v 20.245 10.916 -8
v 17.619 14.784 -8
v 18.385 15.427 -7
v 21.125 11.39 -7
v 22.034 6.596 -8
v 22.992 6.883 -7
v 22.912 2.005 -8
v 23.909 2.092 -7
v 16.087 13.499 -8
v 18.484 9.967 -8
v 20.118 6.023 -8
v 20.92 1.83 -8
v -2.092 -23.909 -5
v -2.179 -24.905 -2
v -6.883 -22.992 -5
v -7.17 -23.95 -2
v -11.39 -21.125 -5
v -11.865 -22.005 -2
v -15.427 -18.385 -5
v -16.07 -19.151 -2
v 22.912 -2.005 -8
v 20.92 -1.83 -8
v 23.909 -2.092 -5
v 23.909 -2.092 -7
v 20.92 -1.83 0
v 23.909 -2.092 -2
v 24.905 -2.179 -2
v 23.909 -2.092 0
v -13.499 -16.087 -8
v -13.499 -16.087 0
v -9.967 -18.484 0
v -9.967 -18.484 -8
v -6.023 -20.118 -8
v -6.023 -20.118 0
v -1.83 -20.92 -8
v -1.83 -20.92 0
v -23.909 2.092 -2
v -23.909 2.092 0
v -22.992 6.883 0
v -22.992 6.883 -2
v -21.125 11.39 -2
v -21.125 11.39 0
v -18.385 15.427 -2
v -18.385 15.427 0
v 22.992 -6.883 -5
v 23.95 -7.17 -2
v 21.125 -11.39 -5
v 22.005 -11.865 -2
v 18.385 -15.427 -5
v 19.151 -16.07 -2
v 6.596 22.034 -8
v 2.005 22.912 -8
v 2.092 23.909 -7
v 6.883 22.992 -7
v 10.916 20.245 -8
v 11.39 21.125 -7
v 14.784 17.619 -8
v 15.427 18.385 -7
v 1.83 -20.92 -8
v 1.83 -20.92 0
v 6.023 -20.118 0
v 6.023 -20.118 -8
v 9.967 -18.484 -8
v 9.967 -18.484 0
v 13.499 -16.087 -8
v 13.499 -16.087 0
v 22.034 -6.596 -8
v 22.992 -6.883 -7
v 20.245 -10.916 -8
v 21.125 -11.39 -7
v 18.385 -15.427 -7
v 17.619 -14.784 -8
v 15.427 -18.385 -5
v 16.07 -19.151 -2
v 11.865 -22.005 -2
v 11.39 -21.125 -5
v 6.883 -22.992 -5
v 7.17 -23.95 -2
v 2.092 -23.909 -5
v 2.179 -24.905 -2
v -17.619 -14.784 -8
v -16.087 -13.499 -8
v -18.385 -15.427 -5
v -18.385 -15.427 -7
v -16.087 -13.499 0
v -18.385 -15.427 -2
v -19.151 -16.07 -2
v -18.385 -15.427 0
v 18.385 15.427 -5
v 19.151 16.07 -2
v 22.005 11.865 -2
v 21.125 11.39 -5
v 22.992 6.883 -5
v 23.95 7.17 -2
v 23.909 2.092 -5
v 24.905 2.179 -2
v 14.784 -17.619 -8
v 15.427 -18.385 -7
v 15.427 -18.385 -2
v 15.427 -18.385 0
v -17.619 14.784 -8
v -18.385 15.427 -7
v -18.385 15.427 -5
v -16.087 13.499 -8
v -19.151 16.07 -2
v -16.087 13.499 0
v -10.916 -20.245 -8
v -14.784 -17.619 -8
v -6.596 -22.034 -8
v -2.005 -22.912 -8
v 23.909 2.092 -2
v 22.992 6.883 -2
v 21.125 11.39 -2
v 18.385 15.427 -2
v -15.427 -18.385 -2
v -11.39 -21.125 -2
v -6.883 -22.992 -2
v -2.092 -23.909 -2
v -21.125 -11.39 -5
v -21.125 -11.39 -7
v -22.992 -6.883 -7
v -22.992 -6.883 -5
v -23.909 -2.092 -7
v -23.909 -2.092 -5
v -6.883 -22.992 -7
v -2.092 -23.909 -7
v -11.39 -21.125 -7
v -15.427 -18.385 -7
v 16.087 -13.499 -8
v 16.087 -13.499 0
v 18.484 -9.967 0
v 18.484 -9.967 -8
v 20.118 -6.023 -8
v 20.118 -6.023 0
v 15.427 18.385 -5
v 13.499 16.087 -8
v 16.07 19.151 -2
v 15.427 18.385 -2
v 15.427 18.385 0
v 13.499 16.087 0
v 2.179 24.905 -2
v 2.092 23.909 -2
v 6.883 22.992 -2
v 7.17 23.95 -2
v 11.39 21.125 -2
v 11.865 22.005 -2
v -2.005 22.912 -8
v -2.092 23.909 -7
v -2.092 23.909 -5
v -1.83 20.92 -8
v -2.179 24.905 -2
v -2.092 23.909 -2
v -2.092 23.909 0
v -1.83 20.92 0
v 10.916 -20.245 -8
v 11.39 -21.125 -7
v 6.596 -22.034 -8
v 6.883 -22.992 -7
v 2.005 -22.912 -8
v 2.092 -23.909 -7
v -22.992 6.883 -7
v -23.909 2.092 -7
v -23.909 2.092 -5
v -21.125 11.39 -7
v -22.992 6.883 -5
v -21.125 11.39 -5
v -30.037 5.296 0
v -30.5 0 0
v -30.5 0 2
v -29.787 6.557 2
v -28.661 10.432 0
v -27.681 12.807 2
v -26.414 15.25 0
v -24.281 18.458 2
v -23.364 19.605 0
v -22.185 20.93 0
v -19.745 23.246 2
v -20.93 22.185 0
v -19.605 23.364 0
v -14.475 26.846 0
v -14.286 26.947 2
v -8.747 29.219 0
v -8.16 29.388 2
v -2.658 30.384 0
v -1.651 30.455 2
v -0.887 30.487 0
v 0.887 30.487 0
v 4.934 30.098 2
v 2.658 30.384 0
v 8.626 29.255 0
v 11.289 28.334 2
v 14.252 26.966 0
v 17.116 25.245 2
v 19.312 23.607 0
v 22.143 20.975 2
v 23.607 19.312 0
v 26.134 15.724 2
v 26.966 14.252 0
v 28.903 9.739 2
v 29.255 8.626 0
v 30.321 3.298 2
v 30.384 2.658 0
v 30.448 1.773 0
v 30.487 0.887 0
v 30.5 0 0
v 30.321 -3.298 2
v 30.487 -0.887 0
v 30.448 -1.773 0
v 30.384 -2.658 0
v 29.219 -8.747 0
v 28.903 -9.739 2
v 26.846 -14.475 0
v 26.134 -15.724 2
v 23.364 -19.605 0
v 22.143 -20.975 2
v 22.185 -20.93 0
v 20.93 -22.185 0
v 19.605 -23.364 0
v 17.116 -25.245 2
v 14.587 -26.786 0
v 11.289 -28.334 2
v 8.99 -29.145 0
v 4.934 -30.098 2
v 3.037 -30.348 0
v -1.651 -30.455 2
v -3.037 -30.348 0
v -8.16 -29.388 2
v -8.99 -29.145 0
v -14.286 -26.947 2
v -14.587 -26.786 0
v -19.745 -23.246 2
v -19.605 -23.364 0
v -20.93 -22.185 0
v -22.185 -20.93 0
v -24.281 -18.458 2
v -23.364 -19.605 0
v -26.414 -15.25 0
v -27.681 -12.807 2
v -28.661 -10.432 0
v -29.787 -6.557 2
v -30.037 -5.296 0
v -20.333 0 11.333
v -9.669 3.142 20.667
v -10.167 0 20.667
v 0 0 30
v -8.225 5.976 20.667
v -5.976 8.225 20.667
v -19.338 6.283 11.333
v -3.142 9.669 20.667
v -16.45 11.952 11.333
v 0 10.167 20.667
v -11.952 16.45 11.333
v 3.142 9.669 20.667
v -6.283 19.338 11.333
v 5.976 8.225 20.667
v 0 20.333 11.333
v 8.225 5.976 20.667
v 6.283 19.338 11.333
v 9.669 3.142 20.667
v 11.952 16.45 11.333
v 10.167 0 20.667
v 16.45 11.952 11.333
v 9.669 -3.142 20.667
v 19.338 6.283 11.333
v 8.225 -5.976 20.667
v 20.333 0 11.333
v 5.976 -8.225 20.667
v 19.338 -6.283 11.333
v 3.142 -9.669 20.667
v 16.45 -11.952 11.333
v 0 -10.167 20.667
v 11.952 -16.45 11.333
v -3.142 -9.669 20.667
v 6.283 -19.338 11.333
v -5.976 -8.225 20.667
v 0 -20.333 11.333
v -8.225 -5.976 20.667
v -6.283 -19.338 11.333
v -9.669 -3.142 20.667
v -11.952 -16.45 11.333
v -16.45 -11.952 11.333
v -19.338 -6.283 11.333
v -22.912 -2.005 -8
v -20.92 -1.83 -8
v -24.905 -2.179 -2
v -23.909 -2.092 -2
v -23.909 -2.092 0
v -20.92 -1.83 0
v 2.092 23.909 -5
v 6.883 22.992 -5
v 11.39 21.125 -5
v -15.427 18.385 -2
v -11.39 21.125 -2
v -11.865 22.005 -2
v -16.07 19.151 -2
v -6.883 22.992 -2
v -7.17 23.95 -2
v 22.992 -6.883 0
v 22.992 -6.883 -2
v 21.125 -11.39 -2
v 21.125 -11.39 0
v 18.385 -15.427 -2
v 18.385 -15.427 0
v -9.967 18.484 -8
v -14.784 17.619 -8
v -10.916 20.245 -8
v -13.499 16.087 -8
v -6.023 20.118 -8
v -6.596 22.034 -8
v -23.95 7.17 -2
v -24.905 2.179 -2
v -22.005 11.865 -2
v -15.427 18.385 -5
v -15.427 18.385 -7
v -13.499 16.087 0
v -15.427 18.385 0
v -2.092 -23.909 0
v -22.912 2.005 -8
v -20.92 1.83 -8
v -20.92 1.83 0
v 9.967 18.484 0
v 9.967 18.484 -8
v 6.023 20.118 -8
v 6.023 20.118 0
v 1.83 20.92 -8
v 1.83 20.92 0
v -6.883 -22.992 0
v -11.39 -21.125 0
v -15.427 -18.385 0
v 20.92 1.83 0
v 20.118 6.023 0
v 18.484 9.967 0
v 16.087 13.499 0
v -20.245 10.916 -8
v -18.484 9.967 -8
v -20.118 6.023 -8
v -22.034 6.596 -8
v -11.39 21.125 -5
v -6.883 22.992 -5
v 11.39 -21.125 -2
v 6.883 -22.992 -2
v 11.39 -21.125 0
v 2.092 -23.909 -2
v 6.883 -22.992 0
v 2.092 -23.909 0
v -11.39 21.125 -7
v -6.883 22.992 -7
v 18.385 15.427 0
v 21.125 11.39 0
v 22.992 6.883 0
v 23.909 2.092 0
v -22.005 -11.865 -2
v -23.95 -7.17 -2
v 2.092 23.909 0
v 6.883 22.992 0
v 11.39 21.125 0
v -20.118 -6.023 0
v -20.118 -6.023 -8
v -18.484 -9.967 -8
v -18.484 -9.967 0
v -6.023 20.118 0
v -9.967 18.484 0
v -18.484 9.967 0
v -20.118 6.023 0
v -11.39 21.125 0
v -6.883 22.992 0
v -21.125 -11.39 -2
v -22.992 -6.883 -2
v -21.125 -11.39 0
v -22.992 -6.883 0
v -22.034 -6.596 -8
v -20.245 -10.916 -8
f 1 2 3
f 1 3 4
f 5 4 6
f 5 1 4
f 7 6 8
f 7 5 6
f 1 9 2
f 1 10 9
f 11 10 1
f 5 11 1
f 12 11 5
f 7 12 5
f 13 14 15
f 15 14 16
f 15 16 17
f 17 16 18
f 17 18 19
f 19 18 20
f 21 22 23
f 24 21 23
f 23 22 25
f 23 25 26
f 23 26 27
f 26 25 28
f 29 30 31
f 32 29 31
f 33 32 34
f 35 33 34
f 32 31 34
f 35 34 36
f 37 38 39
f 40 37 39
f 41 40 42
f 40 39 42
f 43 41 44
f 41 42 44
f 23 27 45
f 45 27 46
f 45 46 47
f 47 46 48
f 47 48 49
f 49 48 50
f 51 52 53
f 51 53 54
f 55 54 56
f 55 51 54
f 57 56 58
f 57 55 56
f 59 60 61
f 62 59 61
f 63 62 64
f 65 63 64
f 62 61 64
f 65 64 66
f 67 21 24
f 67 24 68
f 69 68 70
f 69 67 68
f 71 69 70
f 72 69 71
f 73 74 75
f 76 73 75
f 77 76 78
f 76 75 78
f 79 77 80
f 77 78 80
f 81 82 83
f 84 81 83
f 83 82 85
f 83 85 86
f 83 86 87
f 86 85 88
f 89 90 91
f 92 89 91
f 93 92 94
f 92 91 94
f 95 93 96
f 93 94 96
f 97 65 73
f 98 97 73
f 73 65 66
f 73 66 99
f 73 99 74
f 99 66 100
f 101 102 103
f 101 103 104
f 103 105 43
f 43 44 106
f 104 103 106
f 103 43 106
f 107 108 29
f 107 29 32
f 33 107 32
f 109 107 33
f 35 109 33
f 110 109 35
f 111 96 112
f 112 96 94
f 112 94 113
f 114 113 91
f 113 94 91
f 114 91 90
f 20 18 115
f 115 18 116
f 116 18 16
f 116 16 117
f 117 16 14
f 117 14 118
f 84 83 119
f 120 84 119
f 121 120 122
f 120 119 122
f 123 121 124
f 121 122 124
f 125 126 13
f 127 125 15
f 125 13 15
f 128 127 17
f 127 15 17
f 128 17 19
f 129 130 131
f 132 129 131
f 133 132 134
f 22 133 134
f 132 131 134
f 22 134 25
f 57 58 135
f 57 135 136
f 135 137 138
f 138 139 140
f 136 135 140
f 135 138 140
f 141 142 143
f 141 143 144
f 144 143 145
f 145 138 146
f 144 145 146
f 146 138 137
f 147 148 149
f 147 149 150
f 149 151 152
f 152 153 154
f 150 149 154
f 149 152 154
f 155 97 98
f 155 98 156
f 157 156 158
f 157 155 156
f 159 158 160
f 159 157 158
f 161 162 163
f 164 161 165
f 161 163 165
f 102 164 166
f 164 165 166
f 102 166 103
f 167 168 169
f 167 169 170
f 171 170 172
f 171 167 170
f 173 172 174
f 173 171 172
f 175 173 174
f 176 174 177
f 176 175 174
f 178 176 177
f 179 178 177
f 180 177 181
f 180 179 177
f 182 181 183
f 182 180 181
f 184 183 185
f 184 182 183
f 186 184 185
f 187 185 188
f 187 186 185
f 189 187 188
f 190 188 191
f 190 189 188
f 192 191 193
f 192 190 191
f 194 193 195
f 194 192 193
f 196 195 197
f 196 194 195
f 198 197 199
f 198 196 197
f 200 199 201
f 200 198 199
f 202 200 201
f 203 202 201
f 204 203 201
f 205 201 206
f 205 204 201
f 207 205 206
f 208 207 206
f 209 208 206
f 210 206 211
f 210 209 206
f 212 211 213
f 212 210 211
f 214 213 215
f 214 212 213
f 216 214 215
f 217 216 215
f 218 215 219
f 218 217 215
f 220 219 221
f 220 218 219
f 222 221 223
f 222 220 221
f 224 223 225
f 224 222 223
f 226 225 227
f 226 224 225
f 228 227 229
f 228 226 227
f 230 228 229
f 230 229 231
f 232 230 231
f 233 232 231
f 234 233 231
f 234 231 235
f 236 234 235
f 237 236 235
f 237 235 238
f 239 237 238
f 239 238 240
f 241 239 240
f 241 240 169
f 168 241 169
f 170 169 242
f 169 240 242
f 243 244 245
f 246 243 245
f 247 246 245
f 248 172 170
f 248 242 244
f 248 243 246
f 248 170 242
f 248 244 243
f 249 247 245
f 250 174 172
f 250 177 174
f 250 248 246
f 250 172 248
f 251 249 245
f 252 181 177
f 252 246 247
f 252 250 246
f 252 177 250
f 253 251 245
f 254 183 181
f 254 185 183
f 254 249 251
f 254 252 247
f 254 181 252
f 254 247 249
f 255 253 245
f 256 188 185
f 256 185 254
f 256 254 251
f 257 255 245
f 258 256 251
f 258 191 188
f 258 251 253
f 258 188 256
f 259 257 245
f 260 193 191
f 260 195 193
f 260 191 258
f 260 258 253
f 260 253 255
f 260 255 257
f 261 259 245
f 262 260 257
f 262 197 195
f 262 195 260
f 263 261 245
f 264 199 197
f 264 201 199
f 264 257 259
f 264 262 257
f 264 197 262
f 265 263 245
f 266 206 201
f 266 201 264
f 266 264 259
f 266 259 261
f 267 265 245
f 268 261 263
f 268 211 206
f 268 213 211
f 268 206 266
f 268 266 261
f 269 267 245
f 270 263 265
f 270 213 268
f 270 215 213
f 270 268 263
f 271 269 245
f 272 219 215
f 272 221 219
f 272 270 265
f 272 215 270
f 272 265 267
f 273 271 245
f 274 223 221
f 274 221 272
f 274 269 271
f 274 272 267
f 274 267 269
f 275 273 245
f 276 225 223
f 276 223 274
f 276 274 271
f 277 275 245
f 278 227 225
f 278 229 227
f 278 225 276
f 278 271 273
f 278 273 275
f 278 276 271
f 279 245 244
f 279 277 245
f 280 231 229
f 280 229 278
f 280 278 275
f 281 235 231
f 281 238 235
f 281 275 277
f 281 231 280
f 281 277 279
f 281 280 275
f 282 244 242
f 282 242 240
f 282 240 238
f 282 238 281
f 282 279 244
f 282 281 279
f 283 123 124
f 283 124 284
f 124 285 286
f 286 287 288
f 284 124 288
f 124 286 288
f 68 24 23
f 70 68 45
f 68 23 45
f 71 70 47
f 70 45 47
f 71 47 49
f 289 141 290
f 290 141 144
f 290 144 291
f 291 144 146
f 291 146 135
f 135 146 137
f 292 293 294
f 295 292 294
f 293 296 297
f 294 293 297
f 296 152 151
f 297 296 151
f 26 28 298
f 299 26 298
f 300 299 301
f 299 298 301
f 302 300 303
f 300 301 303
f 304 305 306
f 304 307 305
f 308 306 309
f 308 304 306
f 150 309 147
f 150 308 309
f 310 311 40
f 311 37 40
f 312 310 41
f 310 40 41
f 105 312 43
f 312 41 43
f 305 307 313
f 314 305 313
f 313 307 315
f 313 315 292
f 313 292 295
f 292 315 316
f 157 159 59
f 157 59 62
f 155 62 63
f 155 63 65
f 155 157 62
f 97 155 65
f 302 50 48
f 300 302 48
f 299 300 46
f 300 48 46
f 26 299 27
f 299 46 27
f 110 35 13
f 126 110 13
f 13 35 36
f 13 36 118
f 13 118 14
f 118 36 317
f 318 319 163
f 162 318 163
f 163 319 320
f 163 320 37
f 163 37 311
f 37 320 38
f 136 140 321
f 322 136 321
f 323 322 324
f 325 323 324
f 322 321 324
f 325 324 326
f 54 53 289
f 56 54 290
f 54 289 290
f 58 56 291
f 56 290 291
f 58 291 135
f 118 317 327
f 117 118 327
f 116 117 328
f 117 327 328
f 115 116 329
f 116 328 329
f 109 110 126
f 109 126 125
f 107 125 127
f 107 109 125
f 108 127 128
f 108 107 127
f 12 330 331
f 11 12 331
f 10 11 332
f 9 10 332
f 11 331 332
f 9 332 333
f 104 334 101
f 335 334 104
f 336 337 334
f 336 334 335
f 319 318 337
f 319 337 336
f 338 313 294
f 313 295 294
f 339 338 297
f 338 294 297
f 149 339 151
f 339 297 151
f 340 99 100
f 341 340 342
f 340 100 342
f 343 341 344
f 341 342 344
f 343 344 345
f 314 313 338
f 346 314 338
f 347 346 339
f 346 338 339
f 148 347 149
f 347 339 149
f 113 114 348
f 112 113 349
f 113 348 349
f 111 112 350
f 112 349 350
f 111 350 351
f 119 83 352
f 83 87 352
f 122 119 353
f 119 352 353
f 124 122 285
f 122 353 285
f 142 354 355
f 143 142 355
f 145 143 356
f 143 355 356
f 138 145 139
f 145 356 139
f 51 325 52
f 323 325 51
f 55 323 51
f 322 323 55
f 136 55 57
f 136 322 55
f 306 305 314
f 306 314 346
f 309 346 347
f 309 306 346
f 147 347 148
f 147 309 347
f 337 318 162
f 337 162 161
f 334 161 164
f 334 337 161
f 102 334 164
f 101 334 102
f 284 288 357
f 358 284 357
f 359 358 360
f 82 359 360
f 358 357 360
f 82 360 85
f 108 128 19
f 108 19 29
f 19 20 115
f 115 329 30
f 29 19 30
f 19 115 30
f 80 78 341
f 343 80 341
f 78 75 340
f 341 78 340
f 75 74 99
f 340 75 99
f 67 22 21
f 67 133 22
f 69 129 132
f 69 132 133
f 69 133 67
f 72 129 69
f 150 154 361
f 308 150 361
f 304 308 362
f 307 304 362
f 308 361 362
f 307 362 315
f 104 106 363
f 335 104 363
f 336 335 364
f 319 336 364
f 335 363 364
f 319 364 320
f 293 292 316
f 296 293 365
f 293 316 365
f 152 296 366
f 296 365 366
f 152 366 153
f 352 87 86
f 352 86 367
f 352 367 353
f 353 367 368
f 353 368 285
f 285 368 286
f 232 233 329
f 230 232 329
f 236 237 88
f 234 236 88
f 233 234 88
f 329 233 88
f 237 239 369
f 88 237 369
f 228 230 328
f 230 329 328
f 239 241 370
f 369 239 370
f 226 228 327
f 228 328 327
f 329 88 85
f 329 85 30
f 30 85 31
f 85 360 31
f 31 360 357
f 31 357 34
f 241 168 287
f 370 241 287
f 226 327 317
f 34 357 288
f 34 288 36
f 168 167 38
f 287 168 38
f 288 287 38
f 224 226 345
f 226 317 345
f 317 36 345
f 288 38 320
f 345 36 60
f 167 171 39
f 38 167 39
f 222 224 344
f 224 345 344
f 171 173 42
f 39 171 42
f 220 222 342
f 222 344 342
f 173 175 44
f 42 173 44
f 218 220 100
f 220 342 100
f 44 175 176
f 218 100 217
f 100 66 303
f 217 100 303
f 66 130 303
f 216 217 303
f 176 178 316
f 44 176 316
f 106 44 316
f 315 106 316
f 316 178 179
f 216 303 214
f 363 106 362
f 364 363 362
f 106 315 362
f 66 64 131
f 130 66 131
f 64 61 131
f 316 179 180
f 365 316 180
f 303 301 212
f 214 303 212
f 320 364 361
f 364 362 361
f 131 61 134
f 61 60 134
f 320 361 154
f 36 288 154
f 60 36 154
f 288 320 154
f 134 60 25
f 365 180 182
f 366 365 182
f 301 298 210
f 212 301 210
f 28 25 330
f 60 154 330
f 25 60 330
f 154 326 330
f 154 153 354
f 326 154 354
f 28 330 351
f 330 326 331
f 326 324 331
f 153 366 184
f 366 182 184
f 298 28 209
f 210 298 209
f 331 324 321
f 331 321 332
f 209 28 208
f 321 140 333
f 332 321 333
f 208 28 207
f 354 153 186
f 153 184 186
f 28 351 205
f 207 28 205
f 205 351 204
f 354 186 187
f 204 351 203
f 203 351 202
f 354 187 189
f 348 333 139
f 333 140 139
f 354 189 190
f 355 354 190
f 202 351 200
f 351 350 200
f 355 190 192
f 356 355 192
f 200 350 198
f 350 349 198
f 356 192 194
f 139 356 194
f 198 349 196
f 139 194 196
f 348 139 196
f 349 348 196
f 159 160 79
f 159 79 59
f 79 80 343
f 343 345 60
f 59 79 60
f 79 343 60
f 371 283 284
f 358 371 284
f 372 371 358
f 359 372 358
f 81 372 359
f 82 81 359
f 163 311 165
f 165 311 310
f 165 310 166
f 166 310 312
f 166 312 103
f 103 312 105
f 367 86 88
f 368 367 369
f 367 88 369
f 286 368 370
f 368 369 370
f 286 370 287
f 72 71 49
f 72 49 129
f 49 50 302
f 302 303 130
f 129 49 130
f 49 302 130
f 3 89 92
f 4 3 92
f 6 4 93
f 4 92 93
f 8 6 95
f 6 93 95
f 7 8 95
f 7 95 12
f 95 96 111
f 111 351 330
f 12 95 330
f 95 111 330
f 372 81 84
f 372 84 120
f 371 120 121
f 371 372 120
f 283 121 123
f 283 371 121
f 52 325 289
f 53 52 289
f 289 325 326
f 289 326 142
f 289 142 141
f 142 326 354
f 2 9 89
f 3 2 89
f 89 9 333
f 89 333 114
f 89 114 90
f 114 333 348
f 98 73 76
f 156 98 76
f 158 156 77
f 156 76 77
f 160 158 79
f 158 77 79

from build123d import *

# Parameters (mm, degrees)
F5_DEPTH  = 8
F6_SIZE   = 1
F10_DEPTH = 25


with BuildPart() as f3:
    # F2 (on Front) → F3 (revolve)
    with BuildSketch(Plane.XZ):
        Polygon((-30.5, 2), (-30.5, 0), (0, 0), (0, 30), align=None)
    revolve(axis=Axis((0, 0, 4.0188357234), (0, 0, -1)))

    # F4 (on face) → F5 (join)
    with BuildSketch(Plane(origin=(0, 0, 0), x_dir=(1, 0, 0), z_dir=(0, 0, -1))):
        with BuildLine():
            Line((1.8302705977, 20.9200886599), (2.0917378259, 23.9086727542))
            ThreePointArc((2.0917378259, 23.9086727542), (0, 24), (-2.0917378259, 23.9086727542))
            Line((-2.0917378259, 23.9086727542), (-1.8302705977, 20.9200886599))
            ThreePointArc((-1.8302705977, 20.9200886599), (0, 21), (1.8302705977, 20.9200886599))
        make_face()
        with BuildLine():
            Line((13.4985398034, 16.0869333055), (15.4269026325, 18.3850666349))
            ThreePointArc((15.4269026325, 18.3850666349), (9.1844023768, 22.1731087803), (2.0917378259, 23.9086727542))
            Line((2.0917378259, 23.9086727542), (1.8302705977, 20.9200886599))
            ThreePointArc((1.8302705977, 20.9200886599), (8.0363520797, 19.4014701827), (13.4985398034, 16.0869333055))
        make_face()
        with BuildLine():
            Line((16.0869333055, 13.4985398034), (18.3850666349, 15.4269026325))
            ThreePointArc((18.3850666349, 15.4269026325), (16.9705627485, 16.9705627485), (15.4269026325, 18.3850666349))
            Line((15.4269026325, 18.3850666349), (13.4985398034, 16.0869333055))
            ThreePointArc((13.4985398034, 16.0869333055), (14.8492424049, 14.8492424049), (16.0869333055, 13.4985398034))
        make_face()
        with BuildLine():
            Line((20.9200886599, 1.8302705977), (23.9086727542, 2.0917378259))
            ThreePointArc((23.9086727542, 2.0917378259), (22.1731087803, 9.1844023768), (18.3850666349, 15.4269026325))
            Line((18.3850666349, 15.4269026325), (16.0869333055, 13.4985398034))
            ThreePointArc((16.0869333055, 13.4985398034), (19.4014701827, 8.0363520797), (20.9200886599, 1.8302705977))
        make_face()
        with BuildLine():
            ThreePointArc((23.9086727542, -2.0917378259), (23.977157318, -1.0468652968), (24, 0))
            ThreePointArc((24, 0), (23.977157318, 1.0468652968), (23.9086727542, 2.0917378259))
            Line((23.9086727542, 2.0917378259), (20.9200886599, 1.8302705977))
            ThreePointArc((20.9200886599, 1.8302705977), (20.9800126532, 0.9160071347), (21, 0))
            ThreePointArc((21, 0), (20.9800126532, -0.9160071347), (20.9200886599, -1.8302705977))
            Line((20.9200886599, -1.8302705977), (23.9086727542, -2.0917378259))
        make_face()
        with BuildLine():
            ThreePointArc((18.3850666349, -15.4269026325), (22.1731087803, -9.1844023768), (23.9086727542, -2.0917378259))
            Line((23.9086727542, -2.0917378259), (20.9200886599, -1.8302705977))
            ThreePointArc((20.9200886599, -1.8302705977), (19.4014701827, -8.0363520797), (16.0869333055, -13.4985398034))
            Line((16.0869333055, -13.4985398034), (18.3850666349, -15.4269026325))
        make_face()
        with BuildLine():
            ThreePointArc((15.4269026325, -18.3850666349), (16.9705627485, -16.9705627485), (18.3850666349, -15.4269026325))
            Line((18.3850666349, -15.4269026325), (16.0869333055, -13.4985398034))
            ThreePointArc((16.0869333055, -13.4985398034), (14.8492424049, -14.8492424049), (13.4985398034, -16.0869333055))
            Line((13.4985398034, -16.0869333055), (15.4269026325, -18.3850666349))
        make_face()
        with BuildLine():
            ThreePointArc((2.0917378259, -23.9086727542), (9.1844023768, -22.1731087803), (15.4269026325, -18.3850666349))
            Line((15.4269026325, -18.3850666349), (13.4985398034, -16.0869333055))
            ThreePointArc((13.4985398034, -16.0869333055), (8.0363520797, -19.4014701827), (1.8302705977, -20.9200886599))
            Line((1.8302705977, -20.9200886599), (2.0917378259, -23.9086727542))
        make_face()
        with BuildLine():
            ThreePointArc((-2.0917378259, -23.9086727542), (0, -24), (2.0917378259, -23.9086727542))
            Line((2.0917378259, -23.9086727542), (1.8302705977, -20.9200886599))
            ThreePointArc((1.8302705977, -20.9200886599), (0, -21), (-1.8302705977, -20.9200886599))
            Line((-1.8302705977, -20.9200886599), (-2.0917378259, -23.9086727542))
        make_face()
        with BuildLine():
            ThreePointArc((-15.4269026325, -18.3850666349), (-9.1844023768, -22.1731087803), (-2.0917378259, -23.9086727542))
            Line((-2.0917378259, -23.9086727542), (-1.8302705977, -20.9200886599))
            ThreePointArc((-1.8302705977, -20.9200886599), (-8.0363520797, -19.4014701827), (-13.4985398034, -16.0869333055))
            Line((-13.4985398034, -16.0869333055), (-15.4269026325, -18.3850666349))
        make_face()
        with BuildLine():
            ThreePointArc((-18.3850666349, -15.4269026325), (-16.9705627485, -16.9705627485), (-15.4269026325, -18.3850666349))
            Line((-15.4269026325, -18.3850666349), (-13.4985398034, -16.0869333055))
            ThreePointArc((-13.4985398034, -16.0869333055), (-14.8492424049, -14.8492424049), (-16.0869333055, -13.4985398034))
            Line((-16.0869333055, -13.4985398034), (-18.3850666349, -15.4269026325))
        make_face()
        with BuildLine():
            ThreePointArc((-23.9086727542, -2.0917378259), (-22.1731087803, -9.1844023768), (-18.3850666349, -15.4269026325))
            Line((-18.3850666349, -15.4269026325), (-16.0869333055, -13.4985398034))
            ThreePointArc((-16.0869333055, -13.4985398034), (-19.4014701827, -8.0363520797), (-20.9200886599, -1.8302705977))
            Line((-20.9200886599, -1.8302705977), (-23.9086727542, -2.0917378259))
        make_face()
        with BuildLine():
            Line((-20.9200886599, 1.8302705977), (-23.9086727542, 2.0917378259))
            ThreePointArc((-23.9086727542, 2.0917378259), (-24, 0), (-23.9086727542, -2.0917378259))
            Line((-23.9086727542, -2.0917378259), (-20.9200886599, -1.8302705977))
            ThreePointArc((-20.9200886599, -1.8302705977), (-21, 0), (-20.9200886599, 1.8302705977))
        make_face()
        with BuildLine():
            Line((-16.0869333055, 13.4985398034), (-18.3850666349, 15.4269026325))
            ThreePointArc((-18.3850666349, 15.4269026325), (-22.1731087803, 9.1844023768), (-23.9086727542, 2.0917378259))
            Line((-23.9086727542, 2.0917378259), (-20.9200886599, 1.8302705977))
            ThreePointArc((-20.9200886599, 1.8302705977), (-19.4014701827, 8.0363520797), (-16.0869333055, 13.4985398034))
        make_face()
        with BuildLine():
            Line((-13.4985398034, 16.0869333055), (-15.4269026325, 18.3850666349))
            ThreePointArc((-15.4269026325, 18.3850666349), (-16.9705627485, 16.9705627485), (-18.3850666349, 15.4269026325))
            Line((-18.3850666349, 15.4269026325), (-16.0869333055, 13.4985398034))
            ThreePointArc((-16.0869333055, 13.4985398034), (-14.8492424049, 14.8492424049), (-13.4985398034, 16.0869333055))
        make_face()
        with BuildLine():
            Line((-1.8302705977, 20.9200886599), (-2.0917378259, 23.9086727542))
            ThreePointArc((-2.0917378259, 23.9086727542), (-9.1844023768, 22.1731087803), (-15.4269026325, 18.3850666349))
            Line((-15.4269026325, 18.3850666349), (-13.4985398034, 16.0869333055))
            ThreePointArc((-13.4985398034, 16.0869333055), (-8.0363520797, 19.4014701827), (-1.8302705977, 20.9200886599))
        make_face()
    extrude(amount=F5_DEPTH)

    # F6
    f6_edges = [f3.edges().sort_by_distance(p)[0] for p in [
        (2.091738, 23.908673, -8),
    ]]
    chamfer(f6_edges, length=F6_SIZE)

    # F7 (on Right) → F8 (revolve)
    with BuildSketch(Plane.YZ):
        Polygon((25, -2), (24, -2), (24, -5), align=None)
    revolve(axis=Axis((0, 0, 4.0188357234), (0, 0, -1)))

    # F9 (on Top) + F4 (on face) → F10 (cut)
    with BuildSketch(Plane.XY):
        with BuildLine():
            Line((-23.3643555151, 19.6050220954), (0, 0))
            Line((0, 0), (-19.6050220954, 23.3643555151))
            ThreePointArc((-19.6050220954, 23.3643555151), (-21.5667568262, 21.5667568262), (-23.3643555151, 19.6050220954))
        make_face()
        with BuildLine():
            Line((0, 0), (-30.3839382918, 2.6582501538))
            ThreePointArc((-30.3839382918, 2.6582501538), (-30.5, 0), (-30.3839382918, -2.6582501538))
            Line((-30.3839382918, -2.6582501538), (0, 0))
        make_face()
        with BuildLine():
            Line((-19.6050220954, -23.3643555151), (0, 0))
            Line((0, 0), (-23.3643555151, -19.6050220954))
            ThreePointArc((-23.3643555151, -19.6050220954), (-21.5667568262, -21.5667568262), (-19.6050220954, -23.3643555151))
        make_face()
        with BuildLine():
            Line((2.6582501538, -30.3839382918), (0, 0))
            Line((0, 0), (-2.6582501538, -30.3839382918))
            ThreePointArc((-2.6582501538, -30.3839382918), (0, -30.5), (2.6582501538, -30.3839382918))
        make_face()
        with BuildLine():
            Line((23.3643555151, -19.6050220954), (0, 0))
            Line((0, 0), (19.6050220954, -23.3643555151))
            ThreePointArc((19.6050220954, -23.3643555151), (21.5667568262, -21.5667568262), (23.3643555151, -19.6050220954))
        make_face()
        with BuildLine():
            Line((30.3839382918, 2.6582501538), (0, 0))
            Line((0, 0), (30.3839382918, -2.6582501538))
            ThreePointArc((30.3839382918, -2.6582501538), (30.4709707582, -1.3303913146), (30.5, 0))
            ThreePointArc((30.5, 0), (30.4709707582, 1.3303913146), (30.3839382918, 2.6582501538))
        make_face()
        with BuildLine():
            Line((-2.6582501538, 30.3839382918), (0, 0))
            Line((0, 0), (2.6582501538, 30.3839382918))
            ThreePointArc((2.6582501538, 30.3839382918), (0, 30.5), (-2.6582501538, 30.3839382918))
        make_face()
        with BuildLine():
            Line((19.6050220954, 23.3643555151), (0, 0))
            Line((0, 0), (23.3643555151, 19.6050220954))
            ThreePointArc((23.3643555151, 19.6050220954), (21.5667568262, 21.5667568262), (19.6050220954, 23.3643555151))
        make_face()
    with BuildSketch(Plane(origin=(0, 0, 0), x_dir=(1, 0, 0), z_dir=(0, 0, -1))):
        with BuildLine():
            ThreePointArc((-2.0917378259, 23.9086727542), (0, 24), (2.0917378259, 23.9086727542))
            Line((2.0917378259, 23.9086727542), (2.6582501538, 30.3839382918))
            ThreePointArc((2.6582501538, 30.3839382918), (0, 30.5), (-2.6582501538, 30.3839382918))
            Line((-2.6582501538, 30.3839382918), (-2.0917378259, 23.9086727542))
        make_face()
        with BuildLine():
            Line((23.3643555151, -19.6050220954), (18.3850666349, -15.4269026325))
            ThreePointArc((18.3850666349, -15.4269026325), (16.9705627485, -16.9705627485), (15.4269026325, -18.3850666349))
            Line((15.4269026325, -18.3850666349), (19.6050220954, -23.3643555151))
            ThreePointArc((19.6050220954, -23.3643555151), (21.5667568262, -21.5667568262), (23.3643555151, -19.6050220954))
        make_face()
    extrude(amount=-F10_DEPTH, dir=(0, 0, 1), mode=Mode.SUBTRACT)


solid = f3.part
